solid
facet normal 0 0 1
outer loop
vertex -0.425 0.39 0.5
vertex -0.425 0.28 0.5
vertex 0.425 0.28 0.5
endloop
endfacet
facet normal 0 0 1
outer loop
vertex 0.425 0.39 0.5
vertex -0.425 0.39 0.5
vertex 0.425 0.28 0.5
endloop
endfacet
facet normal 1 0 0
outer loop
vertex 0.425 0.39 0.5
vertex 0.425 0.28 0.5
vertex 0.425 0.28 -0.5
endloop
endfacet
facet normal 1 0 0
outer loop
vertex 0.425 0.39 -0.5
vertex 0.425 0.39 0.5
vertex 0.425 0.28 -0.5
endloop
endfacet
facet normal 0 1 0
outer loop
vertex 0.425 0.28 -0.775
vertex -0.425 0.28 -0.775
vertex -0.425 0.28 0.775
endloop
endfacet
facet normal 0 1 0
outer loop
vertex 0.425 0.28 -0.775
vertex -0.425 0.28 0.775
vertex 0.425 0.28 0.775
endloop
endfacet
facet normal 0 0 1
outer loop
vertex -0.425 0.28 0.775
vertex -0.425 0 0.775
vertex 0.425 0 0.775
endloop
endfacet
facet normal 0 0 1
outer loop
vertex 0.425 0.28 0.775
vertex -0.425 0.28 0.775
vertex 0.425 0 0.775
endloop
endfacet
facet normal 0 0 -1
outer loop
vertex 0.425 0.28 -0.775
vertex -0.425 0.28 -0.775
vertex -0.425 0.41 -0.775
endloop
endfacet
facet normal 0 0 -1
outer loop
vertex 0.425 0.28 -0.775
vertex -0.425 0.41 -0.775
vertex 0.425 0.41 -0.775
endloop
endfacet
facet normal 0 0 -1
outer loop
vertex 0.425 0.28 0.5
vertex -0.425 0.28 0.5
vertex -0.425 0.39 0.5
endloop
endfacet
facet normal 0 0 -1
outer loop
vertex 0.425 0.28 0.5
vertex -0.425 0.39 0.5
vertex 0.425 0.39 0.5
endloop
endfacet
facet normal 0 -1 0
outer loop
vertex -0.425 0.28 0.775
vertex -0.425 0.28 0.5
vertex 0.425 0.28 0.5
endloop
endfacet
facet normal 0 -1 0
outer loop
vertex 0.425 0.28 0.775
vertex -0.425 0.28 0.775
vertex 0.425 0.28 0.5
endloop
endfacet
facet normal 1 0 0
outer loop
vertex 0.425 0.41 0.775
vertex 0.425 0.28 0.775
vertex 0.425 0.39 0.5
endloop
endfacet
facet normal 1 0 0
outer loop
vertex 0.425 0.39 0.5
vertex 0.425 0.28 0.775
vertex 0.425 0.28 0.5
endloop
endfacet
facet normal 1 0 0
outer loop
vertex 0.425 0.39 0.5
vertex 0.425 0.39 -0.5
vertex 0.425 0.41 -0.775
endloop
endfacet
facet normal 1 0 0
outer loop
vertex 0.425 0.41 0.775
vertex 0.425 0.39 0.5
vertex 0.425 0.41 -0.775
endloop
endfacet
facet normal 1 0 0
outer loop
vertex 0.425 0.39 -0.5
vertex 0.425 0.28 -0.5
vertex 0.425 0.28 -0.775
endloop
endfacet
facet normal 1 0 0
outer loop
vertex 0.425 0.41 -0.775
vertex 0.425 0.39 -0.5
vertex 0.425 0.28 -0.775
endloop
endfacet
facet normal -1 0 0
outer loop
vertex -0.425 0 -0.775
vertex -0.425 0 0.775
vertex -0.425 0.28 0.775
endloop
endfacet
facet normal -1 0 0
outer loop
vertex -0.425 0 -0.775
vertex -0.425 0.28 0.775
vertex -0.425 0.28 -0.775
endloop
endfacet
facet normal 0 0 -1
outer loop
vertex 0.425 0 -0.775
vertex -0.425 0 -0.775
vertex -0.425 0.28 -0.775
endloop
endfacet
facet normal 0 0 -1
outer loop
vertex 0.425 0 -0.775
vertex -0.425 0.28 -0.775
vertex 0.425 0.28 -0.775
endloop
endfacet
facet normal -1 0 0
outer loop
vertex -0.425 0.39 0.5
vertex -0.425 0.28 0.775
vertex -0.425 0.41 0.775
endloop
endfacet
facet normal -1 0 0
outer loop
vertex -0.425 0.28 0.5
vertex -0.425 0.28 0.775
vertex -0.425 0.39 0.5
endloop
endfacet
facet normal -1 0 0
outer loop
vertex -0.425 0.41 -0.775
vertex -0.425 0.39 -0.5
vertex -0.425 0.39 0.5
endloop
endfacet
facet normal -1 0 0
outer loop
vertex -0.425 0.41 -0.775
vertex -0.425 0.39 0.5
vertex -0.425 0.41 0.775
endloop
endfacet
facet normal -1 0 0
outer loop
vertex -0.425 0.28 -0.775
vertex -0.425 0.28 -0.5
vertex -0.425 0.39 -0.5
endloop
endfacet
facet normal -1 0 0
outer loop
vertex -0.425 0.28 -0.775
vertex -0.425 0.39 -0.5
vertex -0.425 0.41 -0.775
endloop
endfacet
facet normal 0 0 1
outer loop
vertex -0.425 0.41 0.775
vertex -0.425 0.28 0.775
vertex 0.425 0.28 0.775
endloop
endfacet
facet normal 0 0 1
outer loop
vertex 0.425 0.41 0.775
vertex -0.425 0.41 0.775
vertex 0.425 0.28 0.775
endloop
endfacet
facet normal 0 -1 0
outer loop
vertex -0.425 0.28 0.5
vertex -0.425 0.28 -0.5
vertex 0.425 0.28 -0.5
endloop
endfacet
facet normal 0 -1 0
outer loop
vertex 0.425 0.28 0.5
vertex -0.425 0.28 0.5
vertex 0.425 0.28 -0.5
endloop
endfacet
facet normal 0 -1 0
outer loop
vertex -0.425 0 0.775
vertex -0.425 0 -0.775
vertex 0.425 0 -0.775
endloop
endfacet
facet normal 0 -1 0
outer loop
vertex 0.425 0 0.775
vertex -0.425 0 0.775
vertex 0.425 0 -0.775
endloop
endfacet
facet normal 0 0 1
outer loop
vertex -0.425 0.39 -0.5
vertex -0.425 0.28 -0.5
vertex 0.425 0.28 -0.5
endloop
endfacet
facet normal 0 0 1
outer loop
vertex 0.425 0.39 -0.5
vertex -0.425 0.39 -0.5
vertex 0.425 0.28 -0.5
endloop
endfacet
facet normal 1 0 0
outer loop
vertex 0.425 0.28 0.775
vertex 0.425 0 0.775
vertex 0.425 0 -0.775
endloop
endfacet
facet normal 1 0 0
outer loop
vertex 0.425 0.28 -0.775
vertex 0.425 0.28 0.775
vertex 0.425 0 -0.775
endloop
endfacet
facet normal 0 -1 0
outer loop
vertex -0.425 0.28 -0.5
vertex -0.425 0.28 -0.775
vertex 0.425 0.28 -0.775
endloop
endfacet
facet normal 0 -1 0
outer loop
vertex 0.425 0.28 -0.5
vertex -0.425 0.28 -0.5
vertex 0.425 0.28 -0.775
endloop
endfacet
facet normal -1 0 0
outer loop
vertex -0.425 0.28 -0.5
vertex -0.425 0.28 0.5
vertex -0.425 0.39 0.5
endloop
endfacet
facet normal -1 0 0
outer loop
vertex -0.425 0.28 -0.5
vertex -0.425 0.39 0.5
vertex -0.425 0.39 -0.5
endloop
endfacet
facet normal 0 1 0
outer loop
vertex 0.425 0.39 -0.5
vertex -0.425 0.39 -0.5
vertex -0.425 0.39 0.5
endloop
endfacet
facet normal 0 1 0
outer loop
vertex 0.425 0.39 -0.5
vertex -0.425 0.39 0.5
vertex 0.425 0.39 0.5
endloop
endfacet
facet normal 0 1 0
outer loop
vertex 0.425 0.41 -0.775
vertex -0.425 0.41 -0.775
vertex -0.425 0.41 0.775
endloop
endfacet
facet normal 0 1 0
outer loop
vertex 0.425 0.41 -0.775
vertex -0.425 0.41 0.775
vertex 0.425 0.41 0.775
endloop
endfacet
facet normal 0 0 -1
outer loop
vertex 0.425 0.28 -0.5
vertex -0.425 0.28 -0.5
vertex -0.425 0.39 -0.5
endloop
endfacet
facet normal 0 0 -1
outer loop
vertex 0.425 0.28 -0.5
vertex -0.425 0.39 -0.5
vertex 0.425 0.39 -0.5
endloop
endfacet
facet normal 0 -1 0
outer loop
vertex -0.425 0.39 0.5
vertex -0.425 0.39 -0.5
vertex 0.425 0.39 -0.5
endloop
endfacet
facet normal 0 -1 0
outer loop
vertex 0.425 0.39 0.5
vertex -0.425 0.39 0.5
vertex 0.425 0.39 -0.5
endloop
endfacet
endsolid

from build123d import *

# Parameters (mm, degrees)
SKETCH1_W           = 0.85
SKETCH1_H           = 1.55
BOSS_EXTRUDE1_DEPTH = 0.28
SKETCH2_W           = 0.85
SKETCH2_H           = 1
BOSS_EXTRUDE2_DEPTH = 0.11
SKETCH3_W           = 0.85
SKETCH3_H           = 1
BOSS_EXTRUDE3_DEPTH = 0.02
SKETCH4_W           = 0.85
SKETCH4_H           = 0.275
BOSS_EXTRUDE5_DEPTH = 0.13


with BuildPart() as part:
    # Sketch1 → Boss-Extrude1 (new body)
    with BuildSketch(Plane(origin=(0, 0, 0), x_dir=(1, 0, 0), z_dir=(0, 1, 0))):
        Rectangle(SKETCH1_W, SKETCH1_H)
    extrude(amount=BOSS_EXTRUDE1_DEPTH)


with BuildPart() as body_2:
    # Sketch2 → Boss-Extrude2 (new body)
    with BuildSketch(Plane(origin=(0, 0.28, 0), x_dir=(1, 0, 0), z_dir=(0, 1, 0))):
        Rectangle(SKETCH2_W, SKETCH2_H)
    extrude(amount=BOSS_EXTRUDE2_DEPTH)


with BuildPart() as body_3:
    # Sketch3 → Boss-Extrude3 (new body)
    with BuildSketch(Plane(origin=(0, 0.39, 0), x_dir=(1, 0, 0), z_dir=(0, 1, 0))):
        Rectangle(SKETCH3_W, SKETCH3_H)
    extrude(amount=BOSS_EXTRUDE3_DEPTH)

    # Sketch4 → Boss-Extrude5 (add)
    with BuildSketch(Plane(origin=(0, 0.28, 0), x_dir=(1, 0, 0), z_dir=(0, 1, 0))):
        with Locations((0, 0.6375)):
            Rectangle(SKETCH4_W, SKETCH4_H)
        with Locations((0, -0.6375)):
            Rectangle(SKETCH4_W, SKETCH4_H)
    extrude(amount=BOSS_EXTRUDE5_DEPTH)


solid = Compound([part.part, body_2.part, body_3.part])
